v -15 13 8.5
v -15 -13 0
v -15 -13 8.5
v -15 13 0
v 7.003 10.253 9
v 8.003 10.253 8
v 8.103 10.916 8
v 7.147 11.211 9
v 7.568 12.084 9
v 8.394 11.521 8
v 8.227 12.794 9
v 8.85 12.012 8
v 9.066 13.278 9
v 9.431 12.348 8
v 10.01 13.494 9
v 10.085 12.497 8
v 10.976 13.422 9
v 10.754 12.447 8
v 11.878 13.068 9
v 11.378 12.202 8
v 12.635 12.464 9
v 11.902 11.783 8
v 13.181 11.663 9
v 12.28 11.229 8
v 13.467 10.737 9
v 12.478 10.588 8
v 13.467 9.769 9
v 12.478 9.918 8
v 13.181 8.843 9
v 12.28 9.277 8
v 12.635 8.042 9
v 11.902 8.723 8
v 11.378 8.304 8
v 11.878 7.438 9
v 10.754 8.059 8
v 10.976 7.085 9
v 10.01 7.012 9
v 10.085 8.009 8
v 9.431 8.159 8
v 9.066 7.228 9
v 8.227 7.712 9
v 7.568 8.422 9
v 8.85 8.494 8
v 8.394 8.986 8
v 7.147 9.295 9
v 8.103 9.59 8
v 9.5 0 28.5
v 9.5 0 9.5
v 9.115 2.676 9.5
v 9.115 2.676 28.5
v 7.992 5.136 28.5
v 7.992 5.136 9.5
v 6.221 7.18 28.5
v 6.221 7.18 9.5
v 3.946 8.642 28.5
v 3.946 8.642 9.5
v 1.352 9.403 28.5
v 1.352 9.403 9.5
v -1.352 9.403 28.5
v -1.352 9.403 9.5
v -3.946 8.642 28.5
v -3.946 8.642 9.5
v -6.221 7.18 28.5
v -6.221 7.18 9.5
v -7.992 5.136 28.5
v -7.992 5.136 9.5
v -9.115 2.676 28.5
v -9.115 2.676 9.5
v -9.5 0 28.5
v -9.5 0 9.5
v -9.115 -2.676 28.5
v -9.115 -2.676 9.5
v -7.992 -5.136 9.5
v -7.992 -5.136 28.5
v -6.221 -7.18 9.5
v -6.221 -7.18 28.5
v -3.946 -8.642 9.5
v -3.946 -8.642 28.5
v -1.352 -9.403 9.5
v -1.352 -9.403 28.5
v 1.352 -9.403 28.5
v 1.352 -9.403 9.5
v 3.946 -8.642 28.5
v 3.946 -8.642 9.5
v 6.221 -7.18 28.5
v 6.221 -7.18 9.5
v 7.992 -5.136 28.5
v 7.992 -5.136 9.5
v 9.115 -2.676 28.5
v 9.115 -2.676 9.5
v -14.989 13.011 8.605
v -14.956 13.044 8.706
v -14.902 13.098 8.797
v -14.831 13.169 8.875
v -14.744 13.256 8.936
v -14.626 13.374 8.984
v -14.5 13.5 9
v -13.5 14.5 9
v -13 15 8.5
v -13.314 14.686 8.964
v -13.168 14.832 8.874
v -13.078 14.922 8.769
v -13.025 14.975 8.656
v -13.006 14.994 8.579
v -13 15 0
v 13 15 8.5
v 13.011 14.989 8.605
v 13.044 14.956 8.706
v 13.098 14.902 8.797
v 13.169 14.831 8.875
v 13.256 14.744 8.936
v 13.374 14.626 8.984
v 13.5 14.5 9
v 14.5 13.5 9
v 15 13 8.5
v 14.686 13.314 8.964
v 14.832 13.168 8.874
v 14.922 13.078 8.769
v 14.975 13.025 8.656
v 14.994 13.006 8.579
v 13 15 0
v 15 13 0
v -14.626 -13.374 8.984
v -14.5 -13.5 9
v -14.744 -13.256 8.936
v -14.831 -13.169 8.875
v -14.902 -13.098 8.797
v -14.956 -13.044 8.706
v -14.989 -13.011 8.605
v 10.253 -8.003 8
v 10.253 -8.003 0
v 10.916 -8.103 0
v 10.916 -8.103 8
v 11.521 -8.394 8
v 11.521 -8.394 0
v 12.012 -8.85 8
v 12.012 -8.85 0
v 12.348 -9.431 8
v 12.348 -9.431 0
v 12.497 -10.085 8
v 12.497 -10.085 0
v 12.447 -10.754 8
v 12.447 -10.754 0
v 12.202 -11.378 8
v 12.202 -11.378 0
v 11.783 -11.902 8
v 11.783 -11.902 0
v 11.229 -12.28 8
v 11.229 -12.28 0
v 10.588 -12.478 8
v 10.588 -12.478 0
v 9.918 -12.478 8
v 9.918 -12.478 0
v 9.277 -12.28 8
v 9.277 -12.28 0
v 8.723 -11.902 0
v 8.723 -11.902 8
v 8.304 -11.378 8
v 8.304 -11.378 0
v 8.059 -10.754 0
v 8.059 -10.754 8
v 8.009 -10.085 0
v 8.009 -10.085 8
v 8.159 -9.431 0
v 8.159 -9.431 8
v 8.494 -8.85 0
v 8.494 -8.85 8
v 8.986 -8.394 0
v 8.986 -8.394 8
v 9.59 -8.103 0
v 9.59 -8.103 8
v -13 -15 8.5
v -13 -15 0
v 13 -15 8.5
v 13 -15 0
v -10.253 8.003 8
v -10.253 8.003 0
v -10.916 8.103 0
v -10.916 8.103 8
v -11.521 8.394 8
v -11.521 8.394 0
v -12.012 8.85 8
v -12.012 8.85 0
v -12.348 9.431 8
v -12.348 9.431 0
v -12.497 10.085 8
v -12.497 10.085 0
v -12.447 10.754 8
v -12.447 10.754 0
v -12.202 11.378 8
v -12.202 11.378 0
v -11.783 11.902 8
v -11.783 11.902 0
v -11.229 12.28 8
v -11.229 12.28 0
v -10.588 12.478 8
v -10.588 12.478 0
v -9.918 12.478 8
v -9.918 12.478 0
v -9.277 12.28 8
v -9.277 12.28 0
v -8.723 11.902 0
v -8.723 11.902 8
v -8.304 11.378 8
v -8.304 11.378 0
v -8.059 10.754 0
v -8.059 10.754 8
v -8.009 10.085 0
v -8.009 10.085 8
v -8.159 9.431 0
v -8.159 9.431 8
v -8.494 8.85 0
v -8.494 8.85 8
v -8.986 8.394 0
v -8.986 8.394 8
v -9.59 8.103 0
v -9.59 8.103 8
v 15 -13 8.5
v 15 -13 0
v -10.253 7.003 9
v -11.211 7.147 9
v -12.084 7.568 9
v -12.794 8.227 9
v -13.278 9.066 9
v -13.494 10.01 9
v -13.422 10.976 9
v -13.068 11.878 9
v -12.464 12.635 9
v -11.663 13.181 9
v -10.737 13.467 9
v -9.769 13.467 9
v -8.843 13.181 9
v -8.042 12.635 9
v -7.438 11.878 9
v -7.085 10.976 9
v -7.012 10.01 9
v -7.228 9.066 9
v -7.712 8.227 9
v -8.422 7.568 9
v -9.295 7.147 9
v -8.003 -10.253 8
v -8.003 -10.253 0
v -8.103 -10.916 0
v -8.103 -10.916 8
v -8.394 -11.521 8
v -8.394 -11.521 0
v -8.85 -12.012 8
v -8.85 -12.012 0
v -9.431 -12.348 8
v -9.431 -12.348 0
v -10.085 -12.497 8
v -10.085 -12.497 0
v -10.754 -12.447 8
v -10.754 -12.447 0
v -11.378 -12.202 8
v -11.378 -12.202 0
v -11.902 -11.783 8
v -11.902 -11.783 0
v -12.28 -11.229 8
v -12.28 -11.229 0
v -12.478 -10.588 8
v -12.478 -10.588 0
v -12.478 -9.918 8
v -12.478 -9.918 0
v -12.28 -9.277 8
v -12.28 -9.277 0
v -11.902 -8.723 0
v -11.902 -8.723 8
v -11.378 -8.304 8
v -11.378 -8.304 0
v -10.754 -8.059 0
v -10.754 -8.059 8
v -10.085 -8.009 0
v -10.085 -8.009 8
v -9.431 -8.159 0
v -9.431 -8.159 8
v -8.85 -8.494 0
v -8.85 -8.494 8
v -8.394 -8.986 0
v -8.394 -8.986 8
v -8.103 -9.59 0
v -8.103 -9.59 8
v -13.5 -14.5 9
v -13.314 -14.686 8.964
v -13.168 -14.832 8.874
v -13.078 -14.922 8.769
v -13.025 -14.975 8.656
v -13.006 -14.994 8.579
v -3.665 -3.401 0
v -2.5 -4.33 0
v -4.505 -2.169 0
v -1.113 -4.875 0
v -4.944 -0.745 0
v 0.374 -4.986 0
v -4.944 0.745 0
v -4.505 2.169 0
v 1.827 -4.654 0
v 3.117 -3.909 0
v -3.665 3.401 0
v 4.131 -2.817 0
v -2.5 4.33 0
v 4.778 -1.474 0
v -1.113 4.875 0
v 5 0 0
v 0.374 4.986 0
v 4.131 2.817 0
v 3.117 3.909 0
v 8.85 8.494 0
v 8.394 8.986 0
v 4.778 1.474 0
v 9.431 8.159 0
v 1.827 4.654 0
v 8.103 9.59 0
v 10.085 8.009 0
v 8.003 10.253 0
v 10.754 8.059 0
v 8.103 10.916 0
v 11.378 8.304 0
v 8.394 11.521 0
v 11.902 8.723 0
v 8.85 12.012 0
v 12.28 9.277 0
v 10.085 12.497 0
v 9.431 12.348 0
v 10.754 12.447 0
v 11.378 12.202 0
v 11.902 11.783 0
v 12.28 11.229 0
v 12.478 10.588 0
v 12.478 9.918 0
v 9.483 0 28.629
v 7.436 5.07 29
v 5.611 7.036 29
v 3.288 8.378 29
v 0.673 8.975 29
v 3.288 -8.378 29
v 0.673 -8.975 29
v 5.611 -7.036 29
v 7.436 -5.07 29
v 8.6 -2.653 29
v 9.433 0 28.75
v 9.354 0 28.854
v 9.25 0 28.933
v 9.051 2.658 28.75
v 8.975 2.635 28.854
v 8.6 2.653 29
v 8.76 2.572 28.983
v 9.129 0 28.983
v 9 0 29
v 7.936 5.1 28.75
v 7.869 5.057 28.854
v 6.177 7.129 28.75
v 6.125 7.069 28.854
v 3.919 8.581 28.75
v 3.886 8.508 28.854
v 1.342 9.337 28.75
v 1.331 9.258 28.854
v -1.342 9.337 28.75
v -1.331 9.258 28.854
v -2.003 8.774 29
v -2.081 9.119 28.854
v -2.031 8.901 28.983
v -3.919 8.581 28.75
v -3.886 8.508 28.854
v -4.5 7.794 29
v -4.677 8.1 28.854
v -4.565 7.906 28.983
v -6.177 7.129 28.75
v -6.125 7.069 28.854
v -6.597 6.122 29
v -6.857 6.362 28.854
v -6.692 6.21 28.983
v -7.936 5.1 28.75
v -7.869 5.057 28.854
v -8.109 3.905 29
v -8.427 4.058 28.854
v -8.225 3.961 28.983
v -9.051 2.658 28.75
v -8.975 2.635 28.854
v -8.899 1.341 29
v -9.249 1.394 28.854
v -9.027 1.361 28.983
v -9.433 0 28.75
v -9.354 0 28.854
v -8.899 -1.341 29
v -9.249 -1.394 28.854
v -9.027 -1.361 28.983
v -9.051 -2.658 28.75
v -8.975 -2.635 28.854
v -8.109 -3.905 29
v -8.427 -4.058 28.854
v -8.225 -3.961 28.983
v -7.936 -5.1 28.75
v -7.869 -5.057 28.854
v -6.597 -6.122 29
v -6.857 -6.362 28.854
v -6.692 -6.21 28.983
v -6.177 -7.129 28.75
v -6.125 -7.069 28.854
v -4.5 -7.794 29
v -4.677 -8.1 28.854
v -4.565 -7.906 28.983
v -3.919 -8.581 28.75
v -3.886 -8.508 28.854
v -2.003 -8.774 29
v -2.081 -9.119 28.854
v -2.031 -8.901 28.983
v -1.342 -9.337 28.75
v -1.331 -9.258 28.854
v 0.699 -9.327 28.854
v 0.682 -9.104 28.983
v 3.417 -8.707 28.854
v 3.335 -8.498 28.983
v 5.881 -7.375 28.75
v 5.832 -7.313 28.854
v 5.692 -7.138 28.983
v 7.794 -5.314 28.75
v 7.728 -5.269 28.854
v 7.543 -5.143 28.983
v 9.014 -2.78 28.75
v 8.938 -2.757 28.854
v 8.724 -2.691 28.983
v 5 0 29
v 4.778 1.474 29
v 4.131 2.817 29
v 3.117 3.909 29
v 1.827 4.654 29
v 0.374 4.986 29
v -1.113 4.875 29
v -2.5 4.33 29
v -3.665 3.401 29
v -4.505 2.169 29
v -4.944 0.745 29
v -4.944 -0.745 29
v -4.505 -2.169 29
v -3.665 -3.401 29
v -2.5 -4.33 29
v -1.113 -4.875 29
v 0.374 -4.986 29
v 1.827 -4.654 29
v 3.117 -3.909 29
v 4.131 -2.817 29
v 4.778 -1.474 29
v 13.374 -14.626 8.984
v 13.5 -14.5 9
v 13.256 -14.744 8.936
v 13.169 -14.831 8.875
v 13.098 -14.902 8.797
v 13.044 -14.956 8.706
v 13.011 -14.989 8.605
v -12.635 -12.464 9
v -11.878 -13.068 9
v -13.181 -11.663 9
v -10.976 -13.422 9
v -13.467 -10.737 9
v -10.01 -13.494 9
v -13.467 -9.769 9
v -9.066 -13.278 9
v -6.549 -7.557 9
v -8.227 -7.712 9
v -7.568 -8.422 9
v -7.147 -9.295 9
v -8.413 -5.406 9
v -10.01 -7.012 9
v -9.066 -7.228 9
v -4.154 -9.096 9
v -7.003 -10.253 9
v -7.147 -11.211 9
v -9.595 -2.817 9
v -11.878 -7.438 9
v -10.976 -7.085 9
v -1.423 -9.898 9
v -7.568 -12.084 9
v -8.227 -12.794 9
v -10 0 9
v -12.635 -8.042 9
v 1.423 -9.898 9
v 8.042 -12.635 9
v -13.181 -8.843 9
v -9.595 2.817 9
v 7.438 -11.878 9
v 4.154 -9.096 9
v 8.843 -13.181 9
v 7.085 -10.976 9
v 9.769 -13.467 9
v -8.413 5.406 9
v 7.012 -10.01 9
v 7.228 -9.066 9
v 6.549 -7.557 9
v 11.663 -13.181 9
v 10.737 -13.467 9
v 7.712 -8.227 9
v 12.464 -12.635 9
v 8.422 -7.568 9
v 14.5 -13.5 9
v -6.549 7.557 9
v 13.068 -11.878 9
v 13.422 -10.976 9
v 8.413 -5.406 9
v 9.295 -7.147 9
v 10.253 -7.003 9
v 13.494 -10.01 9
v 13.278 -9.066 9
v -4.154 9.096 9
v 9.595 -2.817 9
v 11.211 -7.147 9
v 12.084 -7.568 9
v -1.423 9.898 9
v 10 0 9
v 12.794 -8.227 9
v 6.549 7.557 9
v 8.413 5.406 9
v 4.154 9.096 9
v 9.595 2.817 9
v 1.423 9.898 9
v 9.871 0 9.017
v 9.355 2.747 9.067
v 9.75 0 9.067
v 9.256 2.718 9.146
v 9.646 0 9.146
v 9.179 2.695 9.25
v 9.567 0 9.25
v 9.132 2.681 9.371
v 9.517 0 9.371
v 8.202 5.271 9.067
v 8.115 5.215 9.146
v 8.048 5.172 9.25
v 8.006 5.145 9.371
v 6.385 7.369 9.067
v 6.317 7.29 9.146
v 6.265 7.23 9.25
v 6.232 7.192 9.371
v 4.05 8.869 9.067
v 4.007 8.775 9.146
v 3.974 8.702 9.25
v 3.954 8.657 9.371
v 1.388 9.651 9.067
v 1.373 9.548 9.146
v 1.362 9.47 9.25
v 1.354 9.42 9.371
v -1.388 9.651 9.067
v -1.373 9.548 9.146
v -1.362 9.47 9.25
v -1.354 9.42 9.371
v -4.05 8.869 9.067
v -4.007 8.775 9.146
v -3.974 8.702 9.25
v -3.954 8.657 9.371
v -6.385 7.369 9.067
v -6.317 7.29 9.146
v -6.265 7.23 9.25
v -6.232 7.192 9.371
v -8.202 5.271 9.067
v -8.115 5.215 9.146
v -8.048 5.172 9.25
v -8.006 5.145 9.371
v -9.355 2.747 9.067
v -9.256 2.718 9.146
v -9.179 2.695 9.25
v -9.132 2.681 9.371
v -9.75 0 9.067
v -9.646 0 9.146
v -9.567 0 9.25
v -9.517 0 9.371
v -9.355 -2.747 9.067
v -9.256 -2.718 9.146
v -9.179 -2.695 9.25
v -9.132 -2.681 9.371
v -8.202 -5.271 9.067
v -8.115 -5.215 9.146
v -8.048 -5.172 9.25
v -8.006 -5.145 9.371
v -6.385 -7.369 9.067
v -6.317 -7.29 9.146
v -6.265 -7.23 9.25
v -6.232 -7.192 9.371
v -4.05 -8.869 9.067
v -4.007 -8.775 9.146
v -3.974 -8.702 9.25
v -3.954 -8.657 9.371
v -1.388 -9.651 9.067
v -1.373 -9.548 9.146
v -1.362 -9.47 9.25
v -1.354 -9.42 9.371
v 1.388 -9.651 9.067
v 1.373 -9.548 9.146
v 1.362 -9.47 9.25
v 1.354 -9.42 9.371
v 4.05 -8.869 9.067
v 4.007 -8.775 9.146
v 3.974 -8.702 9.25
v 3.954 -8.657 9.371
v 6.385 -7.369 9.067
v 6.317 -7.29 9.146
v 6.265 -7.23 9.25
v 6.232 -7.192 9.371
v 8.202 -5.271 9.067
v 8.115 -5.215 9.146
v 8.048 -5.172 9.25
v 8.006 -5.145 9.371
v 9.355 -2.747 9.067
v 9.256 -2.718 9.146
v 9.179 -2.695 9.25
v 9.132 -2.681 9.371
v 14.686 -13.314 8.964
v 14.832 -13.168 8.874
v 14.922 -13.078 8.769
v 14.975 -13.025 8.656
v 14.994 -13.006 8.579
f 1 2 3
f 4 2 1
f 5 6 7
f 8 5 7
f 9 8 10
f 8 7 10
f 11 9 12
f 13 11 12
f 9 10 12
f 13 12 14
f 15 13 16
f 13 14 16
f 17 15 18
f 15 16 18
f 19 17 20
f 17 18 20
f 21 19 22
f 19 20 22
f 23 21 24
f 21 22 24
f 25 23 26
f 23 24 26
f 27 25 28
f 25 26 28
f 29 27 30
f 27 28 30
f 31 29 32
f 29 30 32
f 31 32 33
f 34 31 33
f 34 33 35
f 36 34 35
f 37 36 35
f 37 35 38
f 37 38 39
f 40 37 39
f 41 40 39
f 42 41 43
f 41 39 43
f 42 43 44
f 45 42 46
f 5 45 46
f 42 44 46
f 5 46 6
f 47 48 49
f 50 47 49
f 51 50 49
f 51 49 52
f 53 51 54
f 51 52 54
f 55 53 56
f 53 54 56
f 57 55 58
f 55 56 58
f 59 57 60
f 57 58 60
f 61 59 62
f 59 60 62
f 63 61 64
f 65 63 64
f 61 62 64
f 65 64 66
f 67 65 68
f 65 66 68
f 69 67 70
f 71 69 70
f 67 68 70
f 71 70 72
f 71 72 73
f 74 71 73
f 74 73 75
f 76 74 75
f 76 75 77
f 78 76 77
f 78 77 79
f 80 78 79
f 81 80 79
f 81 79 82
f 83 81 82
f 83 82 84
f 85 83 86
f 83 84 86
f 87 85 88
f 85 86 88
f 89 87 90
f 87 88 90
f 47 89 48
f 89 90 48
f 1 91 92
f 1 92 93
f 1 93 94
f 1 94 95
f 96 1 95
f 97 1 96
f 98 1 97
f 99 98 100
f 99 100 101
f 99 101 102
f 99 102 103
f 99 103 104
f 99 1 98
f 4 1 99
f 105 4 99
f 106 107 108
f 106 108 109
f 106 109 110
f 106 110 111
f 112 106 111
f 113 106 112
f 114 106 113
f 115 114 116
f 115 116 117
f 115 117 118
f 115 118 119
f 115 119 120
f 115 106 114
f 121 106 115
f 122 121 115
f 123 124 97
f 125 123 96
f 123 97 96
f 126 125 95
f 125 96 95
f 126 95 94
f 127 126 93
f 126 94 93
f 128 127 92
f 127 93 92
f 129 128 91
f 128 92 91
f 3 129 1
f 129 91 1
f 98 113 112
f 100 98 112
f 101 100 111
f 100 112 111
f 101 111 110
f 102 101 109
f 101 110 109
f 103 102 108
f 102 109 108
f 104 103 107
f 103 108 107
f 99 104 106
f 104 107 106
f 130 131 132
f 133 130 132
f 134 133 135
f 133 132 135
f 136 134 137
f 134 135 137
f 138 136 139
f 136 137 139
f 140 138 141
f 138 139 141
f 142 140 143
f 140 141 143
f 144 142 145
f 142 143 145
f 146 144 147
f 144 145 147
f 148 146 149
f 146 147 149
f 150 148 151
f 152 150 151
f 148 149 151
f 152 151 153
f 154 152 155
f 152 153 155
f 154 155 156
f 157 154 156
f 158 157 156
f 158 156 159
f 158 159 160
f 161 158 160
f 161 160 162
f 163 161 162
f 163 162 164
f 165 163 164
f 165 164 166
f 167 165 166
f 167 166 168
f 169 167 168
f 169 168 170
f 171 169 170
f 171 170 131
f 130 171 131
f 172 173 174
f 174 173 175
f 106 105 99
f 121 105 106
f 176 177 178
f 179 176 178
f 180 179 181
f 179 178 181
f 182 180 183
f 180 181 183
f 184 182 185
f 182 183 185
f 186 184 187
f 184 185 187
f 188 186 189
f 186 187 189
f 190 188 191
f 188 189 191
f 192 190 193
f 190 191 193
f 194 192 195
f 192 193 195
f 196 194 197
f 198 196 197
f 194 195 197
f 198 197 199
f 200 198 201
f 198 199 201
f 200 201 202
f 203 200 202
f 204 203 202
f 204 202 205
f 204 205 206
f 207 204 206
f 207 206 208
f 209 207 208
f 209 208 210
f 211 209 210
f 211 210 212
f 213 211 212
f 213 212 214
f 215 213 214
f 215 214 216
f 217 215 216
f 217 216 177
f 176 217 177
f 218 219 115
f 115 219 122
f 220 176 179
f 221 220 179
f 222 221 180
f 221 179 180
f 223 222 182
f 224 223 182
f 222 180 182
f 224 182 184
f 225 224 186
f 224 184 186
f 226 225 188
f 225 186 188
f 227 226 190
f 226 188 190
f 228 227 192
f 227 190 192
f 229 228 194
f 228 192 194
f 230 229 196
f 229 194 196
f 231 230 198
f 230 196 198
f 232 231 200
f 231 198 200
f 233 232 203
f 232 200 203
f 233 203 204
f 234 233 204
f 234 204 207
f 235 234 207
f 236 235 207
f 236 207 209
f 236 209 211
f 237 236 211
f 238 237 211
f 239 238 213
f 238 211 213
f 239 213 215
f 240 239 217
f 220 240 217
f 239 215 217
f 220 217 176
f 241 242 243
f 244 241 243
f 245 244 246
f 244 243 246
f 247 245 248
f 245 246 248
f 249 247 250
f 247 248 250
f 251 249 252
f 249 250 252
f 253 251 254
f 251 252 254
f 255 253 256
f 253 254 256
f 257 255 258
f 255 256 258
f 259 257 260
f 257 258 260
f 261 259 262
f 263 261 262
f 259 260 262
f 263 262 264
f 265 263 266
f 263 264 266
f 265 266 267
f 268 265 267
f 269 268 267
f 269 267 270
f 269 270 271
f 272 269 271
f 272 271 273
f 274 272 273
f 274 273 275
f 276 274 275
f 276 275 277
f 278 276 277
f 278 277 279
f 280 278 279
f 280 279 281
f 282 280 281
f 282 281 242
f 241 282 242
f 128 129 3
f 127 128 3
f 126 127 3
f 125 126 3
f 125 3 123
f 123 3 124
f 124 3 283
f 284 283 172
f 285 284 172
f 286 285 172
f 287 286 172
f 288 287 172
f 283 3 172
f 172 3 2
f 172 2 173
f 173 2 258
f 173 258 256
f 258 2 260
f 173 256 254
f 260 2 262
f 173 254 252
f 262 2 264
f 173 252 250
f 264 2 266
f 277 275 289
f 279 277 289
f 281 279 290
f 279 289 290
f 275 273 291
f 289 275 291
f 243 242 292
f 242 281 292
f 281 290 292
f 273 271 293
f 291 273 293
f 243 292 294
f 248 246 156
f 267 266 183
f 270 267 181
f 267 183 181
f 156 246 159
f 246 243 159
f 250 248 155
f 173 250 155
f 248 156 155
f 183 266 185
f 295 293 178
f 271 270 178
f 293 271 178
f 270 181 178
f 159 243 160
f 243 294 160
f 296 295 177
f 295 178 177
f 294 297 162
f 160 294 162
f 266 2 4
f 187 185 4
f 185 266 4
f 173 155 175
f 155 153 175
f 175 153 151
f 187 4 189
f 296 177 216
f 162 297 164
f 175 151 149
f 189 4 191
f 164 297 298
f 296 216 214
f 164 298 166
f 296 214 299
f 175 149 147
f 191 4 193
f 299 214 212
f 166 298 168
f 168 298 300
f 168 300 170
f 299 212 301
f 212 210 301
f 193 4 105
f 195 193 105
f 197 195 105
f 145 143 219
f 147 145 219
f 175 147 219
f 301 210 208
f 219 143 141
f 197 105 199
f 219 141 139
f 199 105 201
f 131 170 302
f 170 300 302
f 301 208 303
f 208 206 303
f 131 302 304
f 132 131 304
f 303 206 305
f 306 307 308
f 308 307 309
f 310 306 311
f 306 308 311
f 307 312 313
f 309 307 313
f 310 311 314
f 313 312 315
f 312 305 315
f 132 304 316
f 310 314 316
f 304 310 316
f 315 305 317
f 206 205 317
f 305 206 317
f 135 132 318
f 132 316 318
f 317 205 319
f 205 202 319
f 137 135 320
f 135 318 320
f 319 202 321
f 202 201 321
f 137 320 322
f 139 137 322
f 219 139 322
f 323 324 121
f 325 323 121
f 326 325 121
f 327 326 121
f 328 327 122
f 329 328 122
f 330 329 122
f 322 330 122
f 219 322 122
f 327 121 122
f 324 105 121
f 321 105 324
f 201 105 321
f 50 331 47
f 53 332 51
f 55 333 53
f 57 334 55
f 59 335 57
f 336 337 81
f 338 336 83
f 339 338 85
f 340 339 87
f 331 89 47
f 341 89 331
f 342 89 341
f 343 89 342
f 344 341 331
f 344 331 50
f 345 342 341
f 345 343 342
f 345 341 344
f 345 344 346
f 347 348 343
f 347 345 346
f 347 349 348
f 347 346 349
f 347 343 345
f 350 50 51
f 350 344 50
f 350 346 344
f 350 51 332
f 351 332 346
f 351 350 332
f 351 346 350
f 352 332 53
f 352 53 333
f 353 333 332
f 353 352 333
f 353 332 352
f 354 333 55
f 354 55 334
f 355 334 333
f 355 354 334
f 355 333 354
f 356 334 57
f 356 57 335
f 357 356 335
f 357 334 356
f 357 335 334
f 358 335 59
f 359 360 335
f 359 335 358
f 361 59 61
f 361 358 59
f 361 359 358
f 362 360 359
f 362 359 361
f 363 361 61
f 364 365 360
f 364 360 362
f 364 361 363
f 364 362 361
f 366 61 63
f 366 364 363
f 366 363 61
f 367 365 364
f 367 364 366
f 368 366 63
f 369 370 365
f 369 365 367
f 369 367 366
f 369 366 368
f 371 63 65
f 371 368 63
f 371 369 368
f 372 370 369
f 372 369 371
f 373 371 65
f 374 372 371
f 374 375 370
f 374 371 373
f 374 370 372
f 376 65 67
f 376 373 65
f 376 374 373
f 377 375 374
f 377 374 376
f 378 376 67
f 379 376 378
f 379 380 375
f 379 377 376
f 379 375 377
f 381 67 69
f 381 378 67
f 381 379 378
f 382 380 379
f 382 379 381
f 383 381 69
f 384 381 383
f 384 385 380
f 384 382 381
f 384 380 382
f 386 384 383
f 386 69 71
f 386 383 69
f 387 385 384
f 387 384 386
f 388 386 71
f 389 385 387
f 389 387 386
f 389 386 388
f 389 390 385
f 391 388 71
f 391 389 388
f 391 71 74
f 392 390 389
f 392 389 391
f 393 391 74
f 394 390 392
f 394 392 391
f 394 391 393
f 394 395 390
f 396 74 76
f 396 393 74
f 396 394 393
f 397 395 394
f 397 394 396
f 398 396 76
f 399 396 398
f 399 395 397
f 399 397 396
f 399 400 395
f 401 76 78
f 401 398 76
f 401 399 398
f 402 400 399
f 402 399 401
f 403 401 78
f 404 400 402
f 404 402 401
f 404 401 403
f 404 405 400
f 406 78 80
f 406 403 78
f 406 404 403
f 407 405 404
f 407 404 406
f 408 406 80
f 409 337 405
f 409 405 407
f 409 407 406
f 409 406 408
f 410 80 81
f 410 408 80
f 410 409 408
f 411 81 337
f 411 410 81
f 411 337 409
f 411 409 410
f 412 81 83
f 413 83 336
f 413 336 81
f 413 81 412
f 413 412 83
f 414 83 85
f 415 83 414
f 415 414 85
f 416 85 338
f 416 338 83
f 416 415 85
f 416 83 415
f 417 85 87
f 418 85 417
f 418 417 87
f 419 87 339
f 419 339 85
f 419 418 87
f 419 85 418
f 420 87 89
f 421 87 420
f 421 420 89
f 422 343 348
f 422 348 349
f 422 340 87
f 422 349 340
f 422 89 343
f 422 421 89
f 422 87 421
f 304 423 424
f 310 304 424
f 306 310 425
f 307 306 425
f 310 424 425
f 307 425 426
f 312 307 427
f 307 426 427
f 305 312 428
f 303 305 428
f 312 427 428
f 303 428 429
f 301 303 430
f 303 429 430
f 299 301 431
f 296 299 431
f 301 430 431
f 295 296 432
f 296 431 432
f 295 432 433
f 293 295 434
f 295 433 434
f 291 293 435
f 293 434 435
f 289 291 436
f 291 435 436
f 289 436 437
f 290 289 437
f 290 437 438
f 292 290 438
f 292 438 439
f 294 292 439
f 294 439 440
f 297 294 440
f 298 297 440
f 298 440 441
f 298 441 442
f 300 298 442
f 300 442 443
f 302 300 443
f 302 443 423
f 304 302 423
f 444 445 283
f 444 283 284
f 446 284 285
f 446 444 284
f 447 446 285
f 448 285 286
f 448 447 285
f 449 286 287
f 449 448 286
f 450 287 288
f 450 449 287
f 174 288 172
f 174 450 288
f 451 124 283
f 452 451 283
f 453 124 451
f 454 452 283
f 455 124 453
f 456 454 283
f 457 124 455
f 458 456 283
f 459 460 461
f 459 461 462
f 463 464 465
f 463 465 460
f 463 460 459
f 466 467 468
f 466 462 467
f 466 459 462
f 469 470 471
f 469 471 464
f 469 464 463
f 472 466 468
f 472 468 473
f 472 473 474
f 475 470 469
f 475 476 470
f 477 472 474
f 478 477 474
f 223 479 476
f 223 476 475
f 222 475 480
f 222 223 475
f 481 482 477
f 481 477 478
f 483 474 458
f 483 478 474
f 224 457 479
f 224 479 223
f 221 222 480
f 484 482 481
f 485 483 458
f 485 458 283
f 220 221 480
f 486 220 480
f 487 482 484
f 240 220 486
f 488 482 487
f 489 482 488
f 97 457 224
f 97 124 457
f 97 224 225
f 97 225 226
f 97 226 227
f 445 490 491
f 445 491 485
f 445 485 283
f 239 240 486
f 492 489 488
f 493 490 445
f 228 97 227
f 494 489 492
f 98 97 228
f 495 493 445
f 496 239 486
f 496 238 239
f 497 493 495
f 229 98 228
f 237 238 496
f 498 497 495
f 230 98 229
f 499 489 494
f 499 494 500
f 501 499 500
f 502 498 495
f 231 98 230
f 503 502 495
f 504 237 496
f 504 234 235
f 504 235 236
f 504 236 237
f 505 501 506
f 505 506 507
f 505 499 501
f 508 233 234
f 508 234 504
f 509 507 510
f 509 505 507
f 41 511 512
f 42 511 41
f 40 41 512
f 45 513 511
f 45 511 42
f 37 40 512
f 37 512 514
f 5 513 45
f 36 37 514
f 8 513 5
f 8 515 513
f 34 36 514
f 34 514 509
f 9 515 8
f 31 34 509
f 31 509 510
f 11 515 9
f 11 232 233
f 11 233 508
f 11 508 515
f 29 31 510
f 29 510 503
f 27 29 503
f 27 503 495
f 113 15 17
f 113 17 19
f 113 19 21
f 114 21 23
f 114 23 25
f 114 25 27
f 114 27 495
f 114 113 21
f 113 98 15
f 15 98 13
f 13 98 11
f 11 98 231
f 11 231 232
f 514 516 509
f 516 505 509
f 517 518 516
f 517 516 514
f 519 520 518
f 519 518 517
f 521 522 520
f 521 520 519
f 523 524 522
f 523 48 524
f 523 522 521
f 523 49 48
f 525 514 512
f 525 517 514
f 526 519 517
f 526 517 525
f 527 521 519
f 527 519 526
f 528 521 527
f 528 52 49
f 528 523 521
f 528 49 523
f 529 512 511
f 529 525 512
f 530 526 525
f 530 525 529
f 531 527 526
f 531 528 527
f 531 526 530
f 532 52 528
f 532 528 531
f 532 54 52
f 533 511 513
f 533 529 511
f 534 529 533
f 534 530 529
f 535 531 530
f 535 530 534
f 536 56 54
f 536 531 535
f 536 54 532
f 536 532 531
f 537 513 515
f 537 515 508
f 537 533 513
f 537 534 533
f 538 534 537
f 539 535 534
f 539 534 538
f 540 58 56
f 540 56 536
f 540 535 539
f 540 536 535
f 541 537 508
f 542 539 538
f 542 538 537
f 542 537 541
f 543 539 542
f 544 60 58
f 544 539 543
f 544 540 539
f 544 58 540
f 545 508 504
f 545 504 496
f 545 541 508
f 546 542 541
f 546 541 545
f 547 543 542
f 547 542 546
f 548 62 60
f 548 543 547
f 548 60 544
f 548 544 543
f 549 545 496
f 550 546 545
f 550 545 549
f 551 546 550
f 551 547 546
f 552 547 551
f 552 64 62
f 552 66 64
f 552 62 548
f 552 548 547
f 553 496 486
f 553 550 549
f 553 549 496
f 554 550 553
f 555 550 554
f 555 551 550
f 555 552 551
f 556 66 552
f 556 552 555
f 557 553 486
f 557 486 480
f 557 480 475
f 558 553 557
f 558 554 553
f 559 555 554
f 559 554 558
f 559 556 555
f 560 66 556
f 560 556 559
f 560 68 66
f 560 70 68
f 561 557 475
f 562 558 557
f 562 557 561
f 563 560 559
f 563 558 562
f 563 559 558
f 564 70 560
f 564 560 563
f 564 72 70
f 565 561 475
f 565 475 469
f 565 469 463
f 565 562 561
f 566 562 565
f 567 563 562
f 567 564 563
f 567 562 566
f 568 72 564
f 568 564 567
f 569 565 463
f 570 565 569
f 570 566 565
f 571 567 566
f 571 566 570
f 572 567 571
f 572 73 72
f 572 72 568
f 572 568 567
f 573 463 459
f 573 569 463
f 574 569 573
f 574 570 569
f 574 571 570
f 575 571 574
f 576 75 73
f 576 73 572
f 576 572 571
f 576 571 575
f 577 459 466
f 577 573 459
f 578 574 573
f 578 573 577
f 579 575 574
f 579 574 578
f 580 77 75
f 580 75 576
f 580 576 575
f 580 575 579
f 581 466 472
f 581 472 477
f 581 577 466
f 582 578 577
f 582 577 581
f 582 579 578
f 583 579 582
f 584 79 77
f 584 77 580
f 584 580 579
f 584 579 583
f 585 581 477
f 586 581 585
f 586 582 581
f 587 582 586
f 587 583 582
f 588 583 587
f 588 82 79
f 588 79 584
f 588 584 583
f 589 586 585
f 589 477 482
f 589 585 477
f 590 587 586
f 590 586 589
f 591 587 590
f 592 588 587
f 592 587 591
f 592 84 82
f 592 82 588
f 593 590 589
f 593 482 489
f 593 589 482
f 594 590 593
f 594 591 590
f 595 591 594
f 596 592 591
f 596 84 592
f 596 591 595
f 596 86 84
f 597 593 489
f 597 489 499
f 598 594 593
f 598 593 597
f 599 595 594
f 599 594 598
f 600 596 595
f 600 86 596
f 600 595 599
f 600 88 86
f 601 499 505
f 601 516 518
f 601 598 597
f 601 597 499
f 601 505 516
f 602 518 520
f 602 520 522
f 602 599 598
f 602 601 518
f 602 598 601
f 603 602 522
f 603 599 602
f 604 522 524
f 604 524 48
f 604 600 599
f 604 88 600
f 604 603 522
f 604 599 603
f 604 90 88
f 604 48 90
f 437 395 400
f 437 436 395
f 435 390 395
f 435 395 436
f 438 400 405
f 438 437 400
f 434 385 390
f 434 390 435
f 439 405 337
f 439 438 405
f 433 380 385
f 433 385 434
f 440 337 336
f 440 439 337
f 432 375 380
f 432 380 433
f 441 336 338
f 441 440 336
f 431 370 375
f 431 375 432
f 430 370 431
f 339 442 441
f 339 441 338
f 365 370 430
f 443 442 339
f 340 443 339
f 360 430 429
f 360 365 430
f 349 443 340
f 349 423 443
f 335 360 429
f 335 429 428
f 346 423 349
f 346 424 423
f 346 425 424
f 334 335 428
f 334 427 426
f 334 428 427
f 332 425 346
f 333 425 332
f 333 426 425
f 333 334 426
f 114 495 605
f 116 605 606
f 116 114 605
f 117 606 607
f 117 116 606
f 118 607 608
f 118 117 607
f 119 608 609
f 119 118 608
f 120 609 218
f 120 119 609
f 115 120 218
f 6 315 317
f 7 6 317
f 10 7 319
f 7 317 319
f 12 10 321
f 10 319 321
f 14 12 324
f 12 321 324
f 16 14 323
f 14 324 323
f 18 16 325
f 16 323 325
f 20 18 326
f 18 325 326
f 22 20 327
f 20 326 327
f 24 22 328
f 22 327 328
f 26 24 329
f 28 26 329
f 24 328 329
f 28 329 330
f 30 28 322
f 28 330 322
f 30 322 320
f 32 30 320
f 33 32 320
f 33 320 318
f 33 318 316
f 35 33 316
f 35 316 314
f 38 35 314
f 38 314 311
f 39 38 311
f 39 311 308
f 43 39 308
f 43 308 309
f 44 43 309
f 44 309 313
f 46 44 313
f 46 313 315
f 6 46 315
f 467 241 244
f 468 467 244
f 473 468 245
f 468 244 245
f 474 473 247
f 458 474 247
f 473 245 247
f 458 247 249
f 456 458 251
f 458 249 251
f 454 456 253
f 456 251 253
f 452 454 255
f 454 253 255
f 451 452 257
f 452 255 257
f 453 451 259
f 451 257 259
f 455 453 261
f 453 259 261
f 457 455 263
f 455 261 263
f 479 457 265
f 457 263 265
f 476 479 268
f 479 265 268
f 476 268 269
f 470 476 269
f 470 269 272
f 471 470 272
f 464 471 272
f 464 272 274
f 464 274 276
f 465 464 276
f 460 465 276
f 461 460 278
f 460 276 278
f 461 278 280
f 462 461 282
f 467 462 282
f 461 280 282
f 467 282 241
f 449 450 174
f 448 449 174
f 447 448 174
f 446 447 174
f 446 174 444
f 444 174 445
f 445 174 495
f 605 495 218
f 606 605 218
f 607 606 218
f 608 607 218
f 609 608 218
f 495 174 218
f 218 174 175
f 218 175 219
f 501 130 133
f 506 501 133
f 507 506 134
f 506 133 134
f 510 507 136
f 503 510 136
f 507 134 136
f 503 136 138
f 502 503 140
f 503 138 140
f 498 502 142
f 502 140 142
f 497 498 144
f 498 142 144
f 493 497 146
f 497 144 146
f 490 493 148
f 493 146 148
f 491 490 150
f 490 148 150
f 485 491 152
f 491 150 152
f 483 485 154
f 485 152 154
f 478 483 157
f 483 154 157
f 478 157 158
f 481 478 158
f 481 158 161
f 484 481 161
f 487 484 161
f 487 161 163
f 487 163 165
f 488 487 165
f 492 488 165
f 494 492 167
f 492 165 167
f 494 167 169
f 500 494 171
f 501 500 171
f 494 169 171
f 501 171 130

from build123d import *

# Parameters (mm, degrees)
SKETCH1_W                    = 30
SKETCH1_H                    = 30
BOSS_EXTRUDE1_DEPTH          = 9
SKETCH2_R                    = 9.5
BOSS_EXTRUDE2_DEPTH          = 20
SKETCH3_R                    = 5
CUT_EXTRUDE1_DEPTH           = 36.930488446
SKETCH4_R                    = 2.25
CUT_EXTRUDE2_DEPTH           = 36.930488446
CHAMFER1_SIZE                = 1
CIRPATTERN1_COUNT            = 4
CHAMFER1_OF_CIRPATTERN1_SIZE = 1
FILLET1_R                    = 0.5
CHAMFER2_SIZE                = 2


with BuildPart() as part:
    # Sketch1 → Boss-Extrude1 (new body)
    with BuildSketch(Plane.XY):
        Rectangle(SKETCH1_W, SKETCH1_H)
    extrude(amount=BOSS_EXTRUDE1_DEPTH)

    # Sketch2 → Boss-Extrude2 (add)
    with BuildSketch(Plane.XY.offset(9)):
        Circle(SKETCH2_R)
    extrude(amount=BOSS_EXTRUDE2_DEPTH)

    # Sketch3 → Cut-Extrude1 (cut, through all)
    with BuildSketch(Plane.XY.offset(29)):
        Circle(SKETCH3_R)
    extrude(amount=-CUT_EXTRUDE1_DEPTH, mode=Mode.SUBTRACT)

    # Sketch4 → Cut-Extrude2 (cut, through all)
    with BuildSketch(Plane(origin=(0, 0, 0), x_dir=(-1, 0, 0), z_dir=(0, 0, -1))):
        with Locations((-10.253048327, 10.253048327)):
            Circle(SKETCH4_R)
    cut_extrude2 = extrude(amount=-CUT_EXTRUDE2_DEPTH, mode=Mode.SUBTRACT)

    # Chamfer1
    chamfer1_edges = [part.edges().sort_by_distance(p)[0] for p in [
        (12.503048327, 10.253048327, 9),
    ]]
    chamfer(chamfer1_edges, length=CHAMFER1_SIZE)

    # CirPattern1: Cut-Extrude2 ×4 about axis
    cirpattern1_axis = Axis((0, 0, 0), (0, 0, 1))
    for i in range(1, CIRPATTERN1_COUNT):
        add(cut_extrude2.rotate(cirpattern1_axis, i * 360 / CIRPATTERN1_COUNT), mode=Mode.SUBTRACT)

    # Chamfer1 of CirPattern1
    chamfer1_of_cirpattern1_edges = [part.edges().sort_by_distance(p)[0] for p in [
        (-10.253048327, 12.503048327, 9),
        (-12.503048327, -10.253048327, 9),
        (10.253048327, -12.503048327, 9),
    ]]
    chamfer(chamfer1_of_cirpattern1_edges, length=CHAMFER1_OF_CIRPATTERN1_SIZE)

    # Fillet1
    fillet1_edges = [part.edges().sort_by_distance(p)[0] for p in [
        (-15, 0, 9),
        (0, -15, 9),
        (-9.5, 0, 9),
        (-9.5, 0, 29),
        (15, 0, 9),
        (0, 15, 9),
    ]]
    fillet(fillet1_edges, radius=FILLET1_R)

    # Chamfer2
    # the kernel refuses this chamfer: 2 mm, written as the material it takes off along each edge
    with BuildSketch(Plane(origin=(15, -15, -5.143365976), x_dir=(-0.9996219169112968, -0.027495876610586487, 0), z_dir=(0, 0, 1)), Plane(origin=(-15, -15, -5.143365976), x_dir=(-0.027495876610586487, 0.9996219169112968, 0), z_dir=(0, 0, 1))) as chamfer2_piece_1:
        Polygon((CHAMFER2_SIZE * 0.999621916911, -CHAMFER2_SIZE * 0.0274958766106), (-CHAMFER2_SIZE * 0.0274958766106, -CHAMFER2_SIZE * 0.999621916911), (0, 0), align=None)
    extrude(amount=18.786731952, mode=Mode.SUBTRACT)
    with BuildSketch(Plane(origin=(15, 15, -5.143365976), x_dir=(-0.9996219169112968, 0.027495876610586487, 0), z_dir=(0, 0, 1)), Plane(origin=(-15, 15, -5.143365976), x_dir=(-0.027495876610586487, -0.9996219169112968, 0), z_dir=(0, 0, 1))) as chamfer2_piece_2:
        Polygon((CHAMFER2_SIZE * 0.999621916911, CHAMFER2_SIZE * 0.0274958766106), (-CHAMFER2_SIZE * 0.0274958766106, CHAMFER2_SIZE * 0.999621916911), (0, 0), align=None)
    extrude(amount=18.786731952, mode=Mode.SUBTRACT)


solid = part.part
